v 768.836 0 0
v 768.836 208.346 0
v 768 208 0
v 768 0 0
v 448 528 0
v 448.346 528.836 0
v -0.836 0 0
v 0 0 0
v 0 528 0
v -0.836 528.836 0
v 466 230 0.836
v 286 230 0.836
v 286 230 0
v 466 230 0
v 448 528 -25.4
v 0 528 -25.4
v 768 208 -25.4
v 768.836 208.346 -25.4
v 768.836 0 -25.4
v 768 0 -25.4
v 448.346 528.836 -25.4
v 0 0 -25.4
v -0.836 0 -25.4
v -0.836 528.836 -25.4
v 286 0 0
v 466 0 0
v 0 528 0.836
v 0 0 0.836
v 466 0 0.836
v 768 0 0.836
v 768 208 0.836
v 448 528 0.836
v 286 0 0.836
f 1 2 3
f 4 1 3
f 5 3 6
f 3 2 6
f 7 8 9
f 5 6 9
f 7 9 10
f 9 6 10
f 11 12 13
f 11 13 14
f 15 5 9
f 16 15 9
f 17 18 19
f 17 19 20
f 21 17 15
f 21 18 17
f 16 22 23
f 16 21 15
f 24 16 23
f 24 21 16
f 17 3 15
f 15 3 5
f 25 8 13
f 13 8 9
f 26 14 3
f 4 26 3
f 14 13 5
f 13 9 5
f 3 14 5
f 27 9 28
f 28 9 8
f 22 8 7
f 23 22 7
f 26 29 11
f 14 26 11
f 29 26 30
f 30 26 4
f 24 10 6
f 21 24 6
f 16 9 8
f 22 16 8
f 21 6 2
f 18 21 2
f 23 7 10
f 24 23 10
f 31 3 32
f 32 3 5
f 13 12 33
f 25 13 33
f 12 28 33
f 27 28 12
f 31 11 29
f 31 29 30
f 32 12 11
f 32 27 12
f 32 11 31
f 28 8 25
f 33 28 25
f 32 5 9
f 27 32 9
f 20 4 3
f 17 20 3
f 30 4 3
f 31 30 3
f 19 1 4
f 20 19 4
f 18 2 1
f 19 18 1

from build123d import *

# Parameters (mm, degrees)
SALIENTE_EXTRUIR1_DEPTH = 0.83566
SALIENTE_EXTRUIR2_DEPTH = 25.4
CORTAR_EXTRUIR1_DEPTH   = 90


with BuildPart() as part:
    # Croquis1 → Saliente-Extruir1 (new body)
    with BuildSketch(Plane.XY):
        Polygon((0, 0), (768, 0), (768, 208), (448, 528), (0, 528), align=None)
    extrude(amount=SALIENTE_EXTRUIR1_DEPTH)

    # Croquis4 → Cortar-Extruir1 (cut)
    with BuildSketch(Plane.XY.offset(0.83566)):
        Polygon((286, 90), (286, 230), (466, 230), (466, 90), (466, 0), (286, 0), align=None)
    extrude(amount=-CORTAR_EXTRUIR1_DEPTH, mode=Mode.SUBTRACT)


with BuildPart() as body_2:
    # Croquis3 → Saliente-Extruir2 (new body)
    with BuildSketch(Plane(origin=(0, 0, 0), x_dir=(-1, 0, 0), z_dir=(0, 0, -1))):
        Polygon((0.83566, 0), (0.83566, 528.83566), (-448.346141706, 528.83566), (-768.83566, 208.346141706), (-768.83566, 0), (-768, 0), (-768, 208), (-448, 528), (0, 528), (0, 0), align=None)
    extrude(amount=SALIENTE_EXTRUIR2_DEPTH)


solid = Compound([part.part, body_2.part])
